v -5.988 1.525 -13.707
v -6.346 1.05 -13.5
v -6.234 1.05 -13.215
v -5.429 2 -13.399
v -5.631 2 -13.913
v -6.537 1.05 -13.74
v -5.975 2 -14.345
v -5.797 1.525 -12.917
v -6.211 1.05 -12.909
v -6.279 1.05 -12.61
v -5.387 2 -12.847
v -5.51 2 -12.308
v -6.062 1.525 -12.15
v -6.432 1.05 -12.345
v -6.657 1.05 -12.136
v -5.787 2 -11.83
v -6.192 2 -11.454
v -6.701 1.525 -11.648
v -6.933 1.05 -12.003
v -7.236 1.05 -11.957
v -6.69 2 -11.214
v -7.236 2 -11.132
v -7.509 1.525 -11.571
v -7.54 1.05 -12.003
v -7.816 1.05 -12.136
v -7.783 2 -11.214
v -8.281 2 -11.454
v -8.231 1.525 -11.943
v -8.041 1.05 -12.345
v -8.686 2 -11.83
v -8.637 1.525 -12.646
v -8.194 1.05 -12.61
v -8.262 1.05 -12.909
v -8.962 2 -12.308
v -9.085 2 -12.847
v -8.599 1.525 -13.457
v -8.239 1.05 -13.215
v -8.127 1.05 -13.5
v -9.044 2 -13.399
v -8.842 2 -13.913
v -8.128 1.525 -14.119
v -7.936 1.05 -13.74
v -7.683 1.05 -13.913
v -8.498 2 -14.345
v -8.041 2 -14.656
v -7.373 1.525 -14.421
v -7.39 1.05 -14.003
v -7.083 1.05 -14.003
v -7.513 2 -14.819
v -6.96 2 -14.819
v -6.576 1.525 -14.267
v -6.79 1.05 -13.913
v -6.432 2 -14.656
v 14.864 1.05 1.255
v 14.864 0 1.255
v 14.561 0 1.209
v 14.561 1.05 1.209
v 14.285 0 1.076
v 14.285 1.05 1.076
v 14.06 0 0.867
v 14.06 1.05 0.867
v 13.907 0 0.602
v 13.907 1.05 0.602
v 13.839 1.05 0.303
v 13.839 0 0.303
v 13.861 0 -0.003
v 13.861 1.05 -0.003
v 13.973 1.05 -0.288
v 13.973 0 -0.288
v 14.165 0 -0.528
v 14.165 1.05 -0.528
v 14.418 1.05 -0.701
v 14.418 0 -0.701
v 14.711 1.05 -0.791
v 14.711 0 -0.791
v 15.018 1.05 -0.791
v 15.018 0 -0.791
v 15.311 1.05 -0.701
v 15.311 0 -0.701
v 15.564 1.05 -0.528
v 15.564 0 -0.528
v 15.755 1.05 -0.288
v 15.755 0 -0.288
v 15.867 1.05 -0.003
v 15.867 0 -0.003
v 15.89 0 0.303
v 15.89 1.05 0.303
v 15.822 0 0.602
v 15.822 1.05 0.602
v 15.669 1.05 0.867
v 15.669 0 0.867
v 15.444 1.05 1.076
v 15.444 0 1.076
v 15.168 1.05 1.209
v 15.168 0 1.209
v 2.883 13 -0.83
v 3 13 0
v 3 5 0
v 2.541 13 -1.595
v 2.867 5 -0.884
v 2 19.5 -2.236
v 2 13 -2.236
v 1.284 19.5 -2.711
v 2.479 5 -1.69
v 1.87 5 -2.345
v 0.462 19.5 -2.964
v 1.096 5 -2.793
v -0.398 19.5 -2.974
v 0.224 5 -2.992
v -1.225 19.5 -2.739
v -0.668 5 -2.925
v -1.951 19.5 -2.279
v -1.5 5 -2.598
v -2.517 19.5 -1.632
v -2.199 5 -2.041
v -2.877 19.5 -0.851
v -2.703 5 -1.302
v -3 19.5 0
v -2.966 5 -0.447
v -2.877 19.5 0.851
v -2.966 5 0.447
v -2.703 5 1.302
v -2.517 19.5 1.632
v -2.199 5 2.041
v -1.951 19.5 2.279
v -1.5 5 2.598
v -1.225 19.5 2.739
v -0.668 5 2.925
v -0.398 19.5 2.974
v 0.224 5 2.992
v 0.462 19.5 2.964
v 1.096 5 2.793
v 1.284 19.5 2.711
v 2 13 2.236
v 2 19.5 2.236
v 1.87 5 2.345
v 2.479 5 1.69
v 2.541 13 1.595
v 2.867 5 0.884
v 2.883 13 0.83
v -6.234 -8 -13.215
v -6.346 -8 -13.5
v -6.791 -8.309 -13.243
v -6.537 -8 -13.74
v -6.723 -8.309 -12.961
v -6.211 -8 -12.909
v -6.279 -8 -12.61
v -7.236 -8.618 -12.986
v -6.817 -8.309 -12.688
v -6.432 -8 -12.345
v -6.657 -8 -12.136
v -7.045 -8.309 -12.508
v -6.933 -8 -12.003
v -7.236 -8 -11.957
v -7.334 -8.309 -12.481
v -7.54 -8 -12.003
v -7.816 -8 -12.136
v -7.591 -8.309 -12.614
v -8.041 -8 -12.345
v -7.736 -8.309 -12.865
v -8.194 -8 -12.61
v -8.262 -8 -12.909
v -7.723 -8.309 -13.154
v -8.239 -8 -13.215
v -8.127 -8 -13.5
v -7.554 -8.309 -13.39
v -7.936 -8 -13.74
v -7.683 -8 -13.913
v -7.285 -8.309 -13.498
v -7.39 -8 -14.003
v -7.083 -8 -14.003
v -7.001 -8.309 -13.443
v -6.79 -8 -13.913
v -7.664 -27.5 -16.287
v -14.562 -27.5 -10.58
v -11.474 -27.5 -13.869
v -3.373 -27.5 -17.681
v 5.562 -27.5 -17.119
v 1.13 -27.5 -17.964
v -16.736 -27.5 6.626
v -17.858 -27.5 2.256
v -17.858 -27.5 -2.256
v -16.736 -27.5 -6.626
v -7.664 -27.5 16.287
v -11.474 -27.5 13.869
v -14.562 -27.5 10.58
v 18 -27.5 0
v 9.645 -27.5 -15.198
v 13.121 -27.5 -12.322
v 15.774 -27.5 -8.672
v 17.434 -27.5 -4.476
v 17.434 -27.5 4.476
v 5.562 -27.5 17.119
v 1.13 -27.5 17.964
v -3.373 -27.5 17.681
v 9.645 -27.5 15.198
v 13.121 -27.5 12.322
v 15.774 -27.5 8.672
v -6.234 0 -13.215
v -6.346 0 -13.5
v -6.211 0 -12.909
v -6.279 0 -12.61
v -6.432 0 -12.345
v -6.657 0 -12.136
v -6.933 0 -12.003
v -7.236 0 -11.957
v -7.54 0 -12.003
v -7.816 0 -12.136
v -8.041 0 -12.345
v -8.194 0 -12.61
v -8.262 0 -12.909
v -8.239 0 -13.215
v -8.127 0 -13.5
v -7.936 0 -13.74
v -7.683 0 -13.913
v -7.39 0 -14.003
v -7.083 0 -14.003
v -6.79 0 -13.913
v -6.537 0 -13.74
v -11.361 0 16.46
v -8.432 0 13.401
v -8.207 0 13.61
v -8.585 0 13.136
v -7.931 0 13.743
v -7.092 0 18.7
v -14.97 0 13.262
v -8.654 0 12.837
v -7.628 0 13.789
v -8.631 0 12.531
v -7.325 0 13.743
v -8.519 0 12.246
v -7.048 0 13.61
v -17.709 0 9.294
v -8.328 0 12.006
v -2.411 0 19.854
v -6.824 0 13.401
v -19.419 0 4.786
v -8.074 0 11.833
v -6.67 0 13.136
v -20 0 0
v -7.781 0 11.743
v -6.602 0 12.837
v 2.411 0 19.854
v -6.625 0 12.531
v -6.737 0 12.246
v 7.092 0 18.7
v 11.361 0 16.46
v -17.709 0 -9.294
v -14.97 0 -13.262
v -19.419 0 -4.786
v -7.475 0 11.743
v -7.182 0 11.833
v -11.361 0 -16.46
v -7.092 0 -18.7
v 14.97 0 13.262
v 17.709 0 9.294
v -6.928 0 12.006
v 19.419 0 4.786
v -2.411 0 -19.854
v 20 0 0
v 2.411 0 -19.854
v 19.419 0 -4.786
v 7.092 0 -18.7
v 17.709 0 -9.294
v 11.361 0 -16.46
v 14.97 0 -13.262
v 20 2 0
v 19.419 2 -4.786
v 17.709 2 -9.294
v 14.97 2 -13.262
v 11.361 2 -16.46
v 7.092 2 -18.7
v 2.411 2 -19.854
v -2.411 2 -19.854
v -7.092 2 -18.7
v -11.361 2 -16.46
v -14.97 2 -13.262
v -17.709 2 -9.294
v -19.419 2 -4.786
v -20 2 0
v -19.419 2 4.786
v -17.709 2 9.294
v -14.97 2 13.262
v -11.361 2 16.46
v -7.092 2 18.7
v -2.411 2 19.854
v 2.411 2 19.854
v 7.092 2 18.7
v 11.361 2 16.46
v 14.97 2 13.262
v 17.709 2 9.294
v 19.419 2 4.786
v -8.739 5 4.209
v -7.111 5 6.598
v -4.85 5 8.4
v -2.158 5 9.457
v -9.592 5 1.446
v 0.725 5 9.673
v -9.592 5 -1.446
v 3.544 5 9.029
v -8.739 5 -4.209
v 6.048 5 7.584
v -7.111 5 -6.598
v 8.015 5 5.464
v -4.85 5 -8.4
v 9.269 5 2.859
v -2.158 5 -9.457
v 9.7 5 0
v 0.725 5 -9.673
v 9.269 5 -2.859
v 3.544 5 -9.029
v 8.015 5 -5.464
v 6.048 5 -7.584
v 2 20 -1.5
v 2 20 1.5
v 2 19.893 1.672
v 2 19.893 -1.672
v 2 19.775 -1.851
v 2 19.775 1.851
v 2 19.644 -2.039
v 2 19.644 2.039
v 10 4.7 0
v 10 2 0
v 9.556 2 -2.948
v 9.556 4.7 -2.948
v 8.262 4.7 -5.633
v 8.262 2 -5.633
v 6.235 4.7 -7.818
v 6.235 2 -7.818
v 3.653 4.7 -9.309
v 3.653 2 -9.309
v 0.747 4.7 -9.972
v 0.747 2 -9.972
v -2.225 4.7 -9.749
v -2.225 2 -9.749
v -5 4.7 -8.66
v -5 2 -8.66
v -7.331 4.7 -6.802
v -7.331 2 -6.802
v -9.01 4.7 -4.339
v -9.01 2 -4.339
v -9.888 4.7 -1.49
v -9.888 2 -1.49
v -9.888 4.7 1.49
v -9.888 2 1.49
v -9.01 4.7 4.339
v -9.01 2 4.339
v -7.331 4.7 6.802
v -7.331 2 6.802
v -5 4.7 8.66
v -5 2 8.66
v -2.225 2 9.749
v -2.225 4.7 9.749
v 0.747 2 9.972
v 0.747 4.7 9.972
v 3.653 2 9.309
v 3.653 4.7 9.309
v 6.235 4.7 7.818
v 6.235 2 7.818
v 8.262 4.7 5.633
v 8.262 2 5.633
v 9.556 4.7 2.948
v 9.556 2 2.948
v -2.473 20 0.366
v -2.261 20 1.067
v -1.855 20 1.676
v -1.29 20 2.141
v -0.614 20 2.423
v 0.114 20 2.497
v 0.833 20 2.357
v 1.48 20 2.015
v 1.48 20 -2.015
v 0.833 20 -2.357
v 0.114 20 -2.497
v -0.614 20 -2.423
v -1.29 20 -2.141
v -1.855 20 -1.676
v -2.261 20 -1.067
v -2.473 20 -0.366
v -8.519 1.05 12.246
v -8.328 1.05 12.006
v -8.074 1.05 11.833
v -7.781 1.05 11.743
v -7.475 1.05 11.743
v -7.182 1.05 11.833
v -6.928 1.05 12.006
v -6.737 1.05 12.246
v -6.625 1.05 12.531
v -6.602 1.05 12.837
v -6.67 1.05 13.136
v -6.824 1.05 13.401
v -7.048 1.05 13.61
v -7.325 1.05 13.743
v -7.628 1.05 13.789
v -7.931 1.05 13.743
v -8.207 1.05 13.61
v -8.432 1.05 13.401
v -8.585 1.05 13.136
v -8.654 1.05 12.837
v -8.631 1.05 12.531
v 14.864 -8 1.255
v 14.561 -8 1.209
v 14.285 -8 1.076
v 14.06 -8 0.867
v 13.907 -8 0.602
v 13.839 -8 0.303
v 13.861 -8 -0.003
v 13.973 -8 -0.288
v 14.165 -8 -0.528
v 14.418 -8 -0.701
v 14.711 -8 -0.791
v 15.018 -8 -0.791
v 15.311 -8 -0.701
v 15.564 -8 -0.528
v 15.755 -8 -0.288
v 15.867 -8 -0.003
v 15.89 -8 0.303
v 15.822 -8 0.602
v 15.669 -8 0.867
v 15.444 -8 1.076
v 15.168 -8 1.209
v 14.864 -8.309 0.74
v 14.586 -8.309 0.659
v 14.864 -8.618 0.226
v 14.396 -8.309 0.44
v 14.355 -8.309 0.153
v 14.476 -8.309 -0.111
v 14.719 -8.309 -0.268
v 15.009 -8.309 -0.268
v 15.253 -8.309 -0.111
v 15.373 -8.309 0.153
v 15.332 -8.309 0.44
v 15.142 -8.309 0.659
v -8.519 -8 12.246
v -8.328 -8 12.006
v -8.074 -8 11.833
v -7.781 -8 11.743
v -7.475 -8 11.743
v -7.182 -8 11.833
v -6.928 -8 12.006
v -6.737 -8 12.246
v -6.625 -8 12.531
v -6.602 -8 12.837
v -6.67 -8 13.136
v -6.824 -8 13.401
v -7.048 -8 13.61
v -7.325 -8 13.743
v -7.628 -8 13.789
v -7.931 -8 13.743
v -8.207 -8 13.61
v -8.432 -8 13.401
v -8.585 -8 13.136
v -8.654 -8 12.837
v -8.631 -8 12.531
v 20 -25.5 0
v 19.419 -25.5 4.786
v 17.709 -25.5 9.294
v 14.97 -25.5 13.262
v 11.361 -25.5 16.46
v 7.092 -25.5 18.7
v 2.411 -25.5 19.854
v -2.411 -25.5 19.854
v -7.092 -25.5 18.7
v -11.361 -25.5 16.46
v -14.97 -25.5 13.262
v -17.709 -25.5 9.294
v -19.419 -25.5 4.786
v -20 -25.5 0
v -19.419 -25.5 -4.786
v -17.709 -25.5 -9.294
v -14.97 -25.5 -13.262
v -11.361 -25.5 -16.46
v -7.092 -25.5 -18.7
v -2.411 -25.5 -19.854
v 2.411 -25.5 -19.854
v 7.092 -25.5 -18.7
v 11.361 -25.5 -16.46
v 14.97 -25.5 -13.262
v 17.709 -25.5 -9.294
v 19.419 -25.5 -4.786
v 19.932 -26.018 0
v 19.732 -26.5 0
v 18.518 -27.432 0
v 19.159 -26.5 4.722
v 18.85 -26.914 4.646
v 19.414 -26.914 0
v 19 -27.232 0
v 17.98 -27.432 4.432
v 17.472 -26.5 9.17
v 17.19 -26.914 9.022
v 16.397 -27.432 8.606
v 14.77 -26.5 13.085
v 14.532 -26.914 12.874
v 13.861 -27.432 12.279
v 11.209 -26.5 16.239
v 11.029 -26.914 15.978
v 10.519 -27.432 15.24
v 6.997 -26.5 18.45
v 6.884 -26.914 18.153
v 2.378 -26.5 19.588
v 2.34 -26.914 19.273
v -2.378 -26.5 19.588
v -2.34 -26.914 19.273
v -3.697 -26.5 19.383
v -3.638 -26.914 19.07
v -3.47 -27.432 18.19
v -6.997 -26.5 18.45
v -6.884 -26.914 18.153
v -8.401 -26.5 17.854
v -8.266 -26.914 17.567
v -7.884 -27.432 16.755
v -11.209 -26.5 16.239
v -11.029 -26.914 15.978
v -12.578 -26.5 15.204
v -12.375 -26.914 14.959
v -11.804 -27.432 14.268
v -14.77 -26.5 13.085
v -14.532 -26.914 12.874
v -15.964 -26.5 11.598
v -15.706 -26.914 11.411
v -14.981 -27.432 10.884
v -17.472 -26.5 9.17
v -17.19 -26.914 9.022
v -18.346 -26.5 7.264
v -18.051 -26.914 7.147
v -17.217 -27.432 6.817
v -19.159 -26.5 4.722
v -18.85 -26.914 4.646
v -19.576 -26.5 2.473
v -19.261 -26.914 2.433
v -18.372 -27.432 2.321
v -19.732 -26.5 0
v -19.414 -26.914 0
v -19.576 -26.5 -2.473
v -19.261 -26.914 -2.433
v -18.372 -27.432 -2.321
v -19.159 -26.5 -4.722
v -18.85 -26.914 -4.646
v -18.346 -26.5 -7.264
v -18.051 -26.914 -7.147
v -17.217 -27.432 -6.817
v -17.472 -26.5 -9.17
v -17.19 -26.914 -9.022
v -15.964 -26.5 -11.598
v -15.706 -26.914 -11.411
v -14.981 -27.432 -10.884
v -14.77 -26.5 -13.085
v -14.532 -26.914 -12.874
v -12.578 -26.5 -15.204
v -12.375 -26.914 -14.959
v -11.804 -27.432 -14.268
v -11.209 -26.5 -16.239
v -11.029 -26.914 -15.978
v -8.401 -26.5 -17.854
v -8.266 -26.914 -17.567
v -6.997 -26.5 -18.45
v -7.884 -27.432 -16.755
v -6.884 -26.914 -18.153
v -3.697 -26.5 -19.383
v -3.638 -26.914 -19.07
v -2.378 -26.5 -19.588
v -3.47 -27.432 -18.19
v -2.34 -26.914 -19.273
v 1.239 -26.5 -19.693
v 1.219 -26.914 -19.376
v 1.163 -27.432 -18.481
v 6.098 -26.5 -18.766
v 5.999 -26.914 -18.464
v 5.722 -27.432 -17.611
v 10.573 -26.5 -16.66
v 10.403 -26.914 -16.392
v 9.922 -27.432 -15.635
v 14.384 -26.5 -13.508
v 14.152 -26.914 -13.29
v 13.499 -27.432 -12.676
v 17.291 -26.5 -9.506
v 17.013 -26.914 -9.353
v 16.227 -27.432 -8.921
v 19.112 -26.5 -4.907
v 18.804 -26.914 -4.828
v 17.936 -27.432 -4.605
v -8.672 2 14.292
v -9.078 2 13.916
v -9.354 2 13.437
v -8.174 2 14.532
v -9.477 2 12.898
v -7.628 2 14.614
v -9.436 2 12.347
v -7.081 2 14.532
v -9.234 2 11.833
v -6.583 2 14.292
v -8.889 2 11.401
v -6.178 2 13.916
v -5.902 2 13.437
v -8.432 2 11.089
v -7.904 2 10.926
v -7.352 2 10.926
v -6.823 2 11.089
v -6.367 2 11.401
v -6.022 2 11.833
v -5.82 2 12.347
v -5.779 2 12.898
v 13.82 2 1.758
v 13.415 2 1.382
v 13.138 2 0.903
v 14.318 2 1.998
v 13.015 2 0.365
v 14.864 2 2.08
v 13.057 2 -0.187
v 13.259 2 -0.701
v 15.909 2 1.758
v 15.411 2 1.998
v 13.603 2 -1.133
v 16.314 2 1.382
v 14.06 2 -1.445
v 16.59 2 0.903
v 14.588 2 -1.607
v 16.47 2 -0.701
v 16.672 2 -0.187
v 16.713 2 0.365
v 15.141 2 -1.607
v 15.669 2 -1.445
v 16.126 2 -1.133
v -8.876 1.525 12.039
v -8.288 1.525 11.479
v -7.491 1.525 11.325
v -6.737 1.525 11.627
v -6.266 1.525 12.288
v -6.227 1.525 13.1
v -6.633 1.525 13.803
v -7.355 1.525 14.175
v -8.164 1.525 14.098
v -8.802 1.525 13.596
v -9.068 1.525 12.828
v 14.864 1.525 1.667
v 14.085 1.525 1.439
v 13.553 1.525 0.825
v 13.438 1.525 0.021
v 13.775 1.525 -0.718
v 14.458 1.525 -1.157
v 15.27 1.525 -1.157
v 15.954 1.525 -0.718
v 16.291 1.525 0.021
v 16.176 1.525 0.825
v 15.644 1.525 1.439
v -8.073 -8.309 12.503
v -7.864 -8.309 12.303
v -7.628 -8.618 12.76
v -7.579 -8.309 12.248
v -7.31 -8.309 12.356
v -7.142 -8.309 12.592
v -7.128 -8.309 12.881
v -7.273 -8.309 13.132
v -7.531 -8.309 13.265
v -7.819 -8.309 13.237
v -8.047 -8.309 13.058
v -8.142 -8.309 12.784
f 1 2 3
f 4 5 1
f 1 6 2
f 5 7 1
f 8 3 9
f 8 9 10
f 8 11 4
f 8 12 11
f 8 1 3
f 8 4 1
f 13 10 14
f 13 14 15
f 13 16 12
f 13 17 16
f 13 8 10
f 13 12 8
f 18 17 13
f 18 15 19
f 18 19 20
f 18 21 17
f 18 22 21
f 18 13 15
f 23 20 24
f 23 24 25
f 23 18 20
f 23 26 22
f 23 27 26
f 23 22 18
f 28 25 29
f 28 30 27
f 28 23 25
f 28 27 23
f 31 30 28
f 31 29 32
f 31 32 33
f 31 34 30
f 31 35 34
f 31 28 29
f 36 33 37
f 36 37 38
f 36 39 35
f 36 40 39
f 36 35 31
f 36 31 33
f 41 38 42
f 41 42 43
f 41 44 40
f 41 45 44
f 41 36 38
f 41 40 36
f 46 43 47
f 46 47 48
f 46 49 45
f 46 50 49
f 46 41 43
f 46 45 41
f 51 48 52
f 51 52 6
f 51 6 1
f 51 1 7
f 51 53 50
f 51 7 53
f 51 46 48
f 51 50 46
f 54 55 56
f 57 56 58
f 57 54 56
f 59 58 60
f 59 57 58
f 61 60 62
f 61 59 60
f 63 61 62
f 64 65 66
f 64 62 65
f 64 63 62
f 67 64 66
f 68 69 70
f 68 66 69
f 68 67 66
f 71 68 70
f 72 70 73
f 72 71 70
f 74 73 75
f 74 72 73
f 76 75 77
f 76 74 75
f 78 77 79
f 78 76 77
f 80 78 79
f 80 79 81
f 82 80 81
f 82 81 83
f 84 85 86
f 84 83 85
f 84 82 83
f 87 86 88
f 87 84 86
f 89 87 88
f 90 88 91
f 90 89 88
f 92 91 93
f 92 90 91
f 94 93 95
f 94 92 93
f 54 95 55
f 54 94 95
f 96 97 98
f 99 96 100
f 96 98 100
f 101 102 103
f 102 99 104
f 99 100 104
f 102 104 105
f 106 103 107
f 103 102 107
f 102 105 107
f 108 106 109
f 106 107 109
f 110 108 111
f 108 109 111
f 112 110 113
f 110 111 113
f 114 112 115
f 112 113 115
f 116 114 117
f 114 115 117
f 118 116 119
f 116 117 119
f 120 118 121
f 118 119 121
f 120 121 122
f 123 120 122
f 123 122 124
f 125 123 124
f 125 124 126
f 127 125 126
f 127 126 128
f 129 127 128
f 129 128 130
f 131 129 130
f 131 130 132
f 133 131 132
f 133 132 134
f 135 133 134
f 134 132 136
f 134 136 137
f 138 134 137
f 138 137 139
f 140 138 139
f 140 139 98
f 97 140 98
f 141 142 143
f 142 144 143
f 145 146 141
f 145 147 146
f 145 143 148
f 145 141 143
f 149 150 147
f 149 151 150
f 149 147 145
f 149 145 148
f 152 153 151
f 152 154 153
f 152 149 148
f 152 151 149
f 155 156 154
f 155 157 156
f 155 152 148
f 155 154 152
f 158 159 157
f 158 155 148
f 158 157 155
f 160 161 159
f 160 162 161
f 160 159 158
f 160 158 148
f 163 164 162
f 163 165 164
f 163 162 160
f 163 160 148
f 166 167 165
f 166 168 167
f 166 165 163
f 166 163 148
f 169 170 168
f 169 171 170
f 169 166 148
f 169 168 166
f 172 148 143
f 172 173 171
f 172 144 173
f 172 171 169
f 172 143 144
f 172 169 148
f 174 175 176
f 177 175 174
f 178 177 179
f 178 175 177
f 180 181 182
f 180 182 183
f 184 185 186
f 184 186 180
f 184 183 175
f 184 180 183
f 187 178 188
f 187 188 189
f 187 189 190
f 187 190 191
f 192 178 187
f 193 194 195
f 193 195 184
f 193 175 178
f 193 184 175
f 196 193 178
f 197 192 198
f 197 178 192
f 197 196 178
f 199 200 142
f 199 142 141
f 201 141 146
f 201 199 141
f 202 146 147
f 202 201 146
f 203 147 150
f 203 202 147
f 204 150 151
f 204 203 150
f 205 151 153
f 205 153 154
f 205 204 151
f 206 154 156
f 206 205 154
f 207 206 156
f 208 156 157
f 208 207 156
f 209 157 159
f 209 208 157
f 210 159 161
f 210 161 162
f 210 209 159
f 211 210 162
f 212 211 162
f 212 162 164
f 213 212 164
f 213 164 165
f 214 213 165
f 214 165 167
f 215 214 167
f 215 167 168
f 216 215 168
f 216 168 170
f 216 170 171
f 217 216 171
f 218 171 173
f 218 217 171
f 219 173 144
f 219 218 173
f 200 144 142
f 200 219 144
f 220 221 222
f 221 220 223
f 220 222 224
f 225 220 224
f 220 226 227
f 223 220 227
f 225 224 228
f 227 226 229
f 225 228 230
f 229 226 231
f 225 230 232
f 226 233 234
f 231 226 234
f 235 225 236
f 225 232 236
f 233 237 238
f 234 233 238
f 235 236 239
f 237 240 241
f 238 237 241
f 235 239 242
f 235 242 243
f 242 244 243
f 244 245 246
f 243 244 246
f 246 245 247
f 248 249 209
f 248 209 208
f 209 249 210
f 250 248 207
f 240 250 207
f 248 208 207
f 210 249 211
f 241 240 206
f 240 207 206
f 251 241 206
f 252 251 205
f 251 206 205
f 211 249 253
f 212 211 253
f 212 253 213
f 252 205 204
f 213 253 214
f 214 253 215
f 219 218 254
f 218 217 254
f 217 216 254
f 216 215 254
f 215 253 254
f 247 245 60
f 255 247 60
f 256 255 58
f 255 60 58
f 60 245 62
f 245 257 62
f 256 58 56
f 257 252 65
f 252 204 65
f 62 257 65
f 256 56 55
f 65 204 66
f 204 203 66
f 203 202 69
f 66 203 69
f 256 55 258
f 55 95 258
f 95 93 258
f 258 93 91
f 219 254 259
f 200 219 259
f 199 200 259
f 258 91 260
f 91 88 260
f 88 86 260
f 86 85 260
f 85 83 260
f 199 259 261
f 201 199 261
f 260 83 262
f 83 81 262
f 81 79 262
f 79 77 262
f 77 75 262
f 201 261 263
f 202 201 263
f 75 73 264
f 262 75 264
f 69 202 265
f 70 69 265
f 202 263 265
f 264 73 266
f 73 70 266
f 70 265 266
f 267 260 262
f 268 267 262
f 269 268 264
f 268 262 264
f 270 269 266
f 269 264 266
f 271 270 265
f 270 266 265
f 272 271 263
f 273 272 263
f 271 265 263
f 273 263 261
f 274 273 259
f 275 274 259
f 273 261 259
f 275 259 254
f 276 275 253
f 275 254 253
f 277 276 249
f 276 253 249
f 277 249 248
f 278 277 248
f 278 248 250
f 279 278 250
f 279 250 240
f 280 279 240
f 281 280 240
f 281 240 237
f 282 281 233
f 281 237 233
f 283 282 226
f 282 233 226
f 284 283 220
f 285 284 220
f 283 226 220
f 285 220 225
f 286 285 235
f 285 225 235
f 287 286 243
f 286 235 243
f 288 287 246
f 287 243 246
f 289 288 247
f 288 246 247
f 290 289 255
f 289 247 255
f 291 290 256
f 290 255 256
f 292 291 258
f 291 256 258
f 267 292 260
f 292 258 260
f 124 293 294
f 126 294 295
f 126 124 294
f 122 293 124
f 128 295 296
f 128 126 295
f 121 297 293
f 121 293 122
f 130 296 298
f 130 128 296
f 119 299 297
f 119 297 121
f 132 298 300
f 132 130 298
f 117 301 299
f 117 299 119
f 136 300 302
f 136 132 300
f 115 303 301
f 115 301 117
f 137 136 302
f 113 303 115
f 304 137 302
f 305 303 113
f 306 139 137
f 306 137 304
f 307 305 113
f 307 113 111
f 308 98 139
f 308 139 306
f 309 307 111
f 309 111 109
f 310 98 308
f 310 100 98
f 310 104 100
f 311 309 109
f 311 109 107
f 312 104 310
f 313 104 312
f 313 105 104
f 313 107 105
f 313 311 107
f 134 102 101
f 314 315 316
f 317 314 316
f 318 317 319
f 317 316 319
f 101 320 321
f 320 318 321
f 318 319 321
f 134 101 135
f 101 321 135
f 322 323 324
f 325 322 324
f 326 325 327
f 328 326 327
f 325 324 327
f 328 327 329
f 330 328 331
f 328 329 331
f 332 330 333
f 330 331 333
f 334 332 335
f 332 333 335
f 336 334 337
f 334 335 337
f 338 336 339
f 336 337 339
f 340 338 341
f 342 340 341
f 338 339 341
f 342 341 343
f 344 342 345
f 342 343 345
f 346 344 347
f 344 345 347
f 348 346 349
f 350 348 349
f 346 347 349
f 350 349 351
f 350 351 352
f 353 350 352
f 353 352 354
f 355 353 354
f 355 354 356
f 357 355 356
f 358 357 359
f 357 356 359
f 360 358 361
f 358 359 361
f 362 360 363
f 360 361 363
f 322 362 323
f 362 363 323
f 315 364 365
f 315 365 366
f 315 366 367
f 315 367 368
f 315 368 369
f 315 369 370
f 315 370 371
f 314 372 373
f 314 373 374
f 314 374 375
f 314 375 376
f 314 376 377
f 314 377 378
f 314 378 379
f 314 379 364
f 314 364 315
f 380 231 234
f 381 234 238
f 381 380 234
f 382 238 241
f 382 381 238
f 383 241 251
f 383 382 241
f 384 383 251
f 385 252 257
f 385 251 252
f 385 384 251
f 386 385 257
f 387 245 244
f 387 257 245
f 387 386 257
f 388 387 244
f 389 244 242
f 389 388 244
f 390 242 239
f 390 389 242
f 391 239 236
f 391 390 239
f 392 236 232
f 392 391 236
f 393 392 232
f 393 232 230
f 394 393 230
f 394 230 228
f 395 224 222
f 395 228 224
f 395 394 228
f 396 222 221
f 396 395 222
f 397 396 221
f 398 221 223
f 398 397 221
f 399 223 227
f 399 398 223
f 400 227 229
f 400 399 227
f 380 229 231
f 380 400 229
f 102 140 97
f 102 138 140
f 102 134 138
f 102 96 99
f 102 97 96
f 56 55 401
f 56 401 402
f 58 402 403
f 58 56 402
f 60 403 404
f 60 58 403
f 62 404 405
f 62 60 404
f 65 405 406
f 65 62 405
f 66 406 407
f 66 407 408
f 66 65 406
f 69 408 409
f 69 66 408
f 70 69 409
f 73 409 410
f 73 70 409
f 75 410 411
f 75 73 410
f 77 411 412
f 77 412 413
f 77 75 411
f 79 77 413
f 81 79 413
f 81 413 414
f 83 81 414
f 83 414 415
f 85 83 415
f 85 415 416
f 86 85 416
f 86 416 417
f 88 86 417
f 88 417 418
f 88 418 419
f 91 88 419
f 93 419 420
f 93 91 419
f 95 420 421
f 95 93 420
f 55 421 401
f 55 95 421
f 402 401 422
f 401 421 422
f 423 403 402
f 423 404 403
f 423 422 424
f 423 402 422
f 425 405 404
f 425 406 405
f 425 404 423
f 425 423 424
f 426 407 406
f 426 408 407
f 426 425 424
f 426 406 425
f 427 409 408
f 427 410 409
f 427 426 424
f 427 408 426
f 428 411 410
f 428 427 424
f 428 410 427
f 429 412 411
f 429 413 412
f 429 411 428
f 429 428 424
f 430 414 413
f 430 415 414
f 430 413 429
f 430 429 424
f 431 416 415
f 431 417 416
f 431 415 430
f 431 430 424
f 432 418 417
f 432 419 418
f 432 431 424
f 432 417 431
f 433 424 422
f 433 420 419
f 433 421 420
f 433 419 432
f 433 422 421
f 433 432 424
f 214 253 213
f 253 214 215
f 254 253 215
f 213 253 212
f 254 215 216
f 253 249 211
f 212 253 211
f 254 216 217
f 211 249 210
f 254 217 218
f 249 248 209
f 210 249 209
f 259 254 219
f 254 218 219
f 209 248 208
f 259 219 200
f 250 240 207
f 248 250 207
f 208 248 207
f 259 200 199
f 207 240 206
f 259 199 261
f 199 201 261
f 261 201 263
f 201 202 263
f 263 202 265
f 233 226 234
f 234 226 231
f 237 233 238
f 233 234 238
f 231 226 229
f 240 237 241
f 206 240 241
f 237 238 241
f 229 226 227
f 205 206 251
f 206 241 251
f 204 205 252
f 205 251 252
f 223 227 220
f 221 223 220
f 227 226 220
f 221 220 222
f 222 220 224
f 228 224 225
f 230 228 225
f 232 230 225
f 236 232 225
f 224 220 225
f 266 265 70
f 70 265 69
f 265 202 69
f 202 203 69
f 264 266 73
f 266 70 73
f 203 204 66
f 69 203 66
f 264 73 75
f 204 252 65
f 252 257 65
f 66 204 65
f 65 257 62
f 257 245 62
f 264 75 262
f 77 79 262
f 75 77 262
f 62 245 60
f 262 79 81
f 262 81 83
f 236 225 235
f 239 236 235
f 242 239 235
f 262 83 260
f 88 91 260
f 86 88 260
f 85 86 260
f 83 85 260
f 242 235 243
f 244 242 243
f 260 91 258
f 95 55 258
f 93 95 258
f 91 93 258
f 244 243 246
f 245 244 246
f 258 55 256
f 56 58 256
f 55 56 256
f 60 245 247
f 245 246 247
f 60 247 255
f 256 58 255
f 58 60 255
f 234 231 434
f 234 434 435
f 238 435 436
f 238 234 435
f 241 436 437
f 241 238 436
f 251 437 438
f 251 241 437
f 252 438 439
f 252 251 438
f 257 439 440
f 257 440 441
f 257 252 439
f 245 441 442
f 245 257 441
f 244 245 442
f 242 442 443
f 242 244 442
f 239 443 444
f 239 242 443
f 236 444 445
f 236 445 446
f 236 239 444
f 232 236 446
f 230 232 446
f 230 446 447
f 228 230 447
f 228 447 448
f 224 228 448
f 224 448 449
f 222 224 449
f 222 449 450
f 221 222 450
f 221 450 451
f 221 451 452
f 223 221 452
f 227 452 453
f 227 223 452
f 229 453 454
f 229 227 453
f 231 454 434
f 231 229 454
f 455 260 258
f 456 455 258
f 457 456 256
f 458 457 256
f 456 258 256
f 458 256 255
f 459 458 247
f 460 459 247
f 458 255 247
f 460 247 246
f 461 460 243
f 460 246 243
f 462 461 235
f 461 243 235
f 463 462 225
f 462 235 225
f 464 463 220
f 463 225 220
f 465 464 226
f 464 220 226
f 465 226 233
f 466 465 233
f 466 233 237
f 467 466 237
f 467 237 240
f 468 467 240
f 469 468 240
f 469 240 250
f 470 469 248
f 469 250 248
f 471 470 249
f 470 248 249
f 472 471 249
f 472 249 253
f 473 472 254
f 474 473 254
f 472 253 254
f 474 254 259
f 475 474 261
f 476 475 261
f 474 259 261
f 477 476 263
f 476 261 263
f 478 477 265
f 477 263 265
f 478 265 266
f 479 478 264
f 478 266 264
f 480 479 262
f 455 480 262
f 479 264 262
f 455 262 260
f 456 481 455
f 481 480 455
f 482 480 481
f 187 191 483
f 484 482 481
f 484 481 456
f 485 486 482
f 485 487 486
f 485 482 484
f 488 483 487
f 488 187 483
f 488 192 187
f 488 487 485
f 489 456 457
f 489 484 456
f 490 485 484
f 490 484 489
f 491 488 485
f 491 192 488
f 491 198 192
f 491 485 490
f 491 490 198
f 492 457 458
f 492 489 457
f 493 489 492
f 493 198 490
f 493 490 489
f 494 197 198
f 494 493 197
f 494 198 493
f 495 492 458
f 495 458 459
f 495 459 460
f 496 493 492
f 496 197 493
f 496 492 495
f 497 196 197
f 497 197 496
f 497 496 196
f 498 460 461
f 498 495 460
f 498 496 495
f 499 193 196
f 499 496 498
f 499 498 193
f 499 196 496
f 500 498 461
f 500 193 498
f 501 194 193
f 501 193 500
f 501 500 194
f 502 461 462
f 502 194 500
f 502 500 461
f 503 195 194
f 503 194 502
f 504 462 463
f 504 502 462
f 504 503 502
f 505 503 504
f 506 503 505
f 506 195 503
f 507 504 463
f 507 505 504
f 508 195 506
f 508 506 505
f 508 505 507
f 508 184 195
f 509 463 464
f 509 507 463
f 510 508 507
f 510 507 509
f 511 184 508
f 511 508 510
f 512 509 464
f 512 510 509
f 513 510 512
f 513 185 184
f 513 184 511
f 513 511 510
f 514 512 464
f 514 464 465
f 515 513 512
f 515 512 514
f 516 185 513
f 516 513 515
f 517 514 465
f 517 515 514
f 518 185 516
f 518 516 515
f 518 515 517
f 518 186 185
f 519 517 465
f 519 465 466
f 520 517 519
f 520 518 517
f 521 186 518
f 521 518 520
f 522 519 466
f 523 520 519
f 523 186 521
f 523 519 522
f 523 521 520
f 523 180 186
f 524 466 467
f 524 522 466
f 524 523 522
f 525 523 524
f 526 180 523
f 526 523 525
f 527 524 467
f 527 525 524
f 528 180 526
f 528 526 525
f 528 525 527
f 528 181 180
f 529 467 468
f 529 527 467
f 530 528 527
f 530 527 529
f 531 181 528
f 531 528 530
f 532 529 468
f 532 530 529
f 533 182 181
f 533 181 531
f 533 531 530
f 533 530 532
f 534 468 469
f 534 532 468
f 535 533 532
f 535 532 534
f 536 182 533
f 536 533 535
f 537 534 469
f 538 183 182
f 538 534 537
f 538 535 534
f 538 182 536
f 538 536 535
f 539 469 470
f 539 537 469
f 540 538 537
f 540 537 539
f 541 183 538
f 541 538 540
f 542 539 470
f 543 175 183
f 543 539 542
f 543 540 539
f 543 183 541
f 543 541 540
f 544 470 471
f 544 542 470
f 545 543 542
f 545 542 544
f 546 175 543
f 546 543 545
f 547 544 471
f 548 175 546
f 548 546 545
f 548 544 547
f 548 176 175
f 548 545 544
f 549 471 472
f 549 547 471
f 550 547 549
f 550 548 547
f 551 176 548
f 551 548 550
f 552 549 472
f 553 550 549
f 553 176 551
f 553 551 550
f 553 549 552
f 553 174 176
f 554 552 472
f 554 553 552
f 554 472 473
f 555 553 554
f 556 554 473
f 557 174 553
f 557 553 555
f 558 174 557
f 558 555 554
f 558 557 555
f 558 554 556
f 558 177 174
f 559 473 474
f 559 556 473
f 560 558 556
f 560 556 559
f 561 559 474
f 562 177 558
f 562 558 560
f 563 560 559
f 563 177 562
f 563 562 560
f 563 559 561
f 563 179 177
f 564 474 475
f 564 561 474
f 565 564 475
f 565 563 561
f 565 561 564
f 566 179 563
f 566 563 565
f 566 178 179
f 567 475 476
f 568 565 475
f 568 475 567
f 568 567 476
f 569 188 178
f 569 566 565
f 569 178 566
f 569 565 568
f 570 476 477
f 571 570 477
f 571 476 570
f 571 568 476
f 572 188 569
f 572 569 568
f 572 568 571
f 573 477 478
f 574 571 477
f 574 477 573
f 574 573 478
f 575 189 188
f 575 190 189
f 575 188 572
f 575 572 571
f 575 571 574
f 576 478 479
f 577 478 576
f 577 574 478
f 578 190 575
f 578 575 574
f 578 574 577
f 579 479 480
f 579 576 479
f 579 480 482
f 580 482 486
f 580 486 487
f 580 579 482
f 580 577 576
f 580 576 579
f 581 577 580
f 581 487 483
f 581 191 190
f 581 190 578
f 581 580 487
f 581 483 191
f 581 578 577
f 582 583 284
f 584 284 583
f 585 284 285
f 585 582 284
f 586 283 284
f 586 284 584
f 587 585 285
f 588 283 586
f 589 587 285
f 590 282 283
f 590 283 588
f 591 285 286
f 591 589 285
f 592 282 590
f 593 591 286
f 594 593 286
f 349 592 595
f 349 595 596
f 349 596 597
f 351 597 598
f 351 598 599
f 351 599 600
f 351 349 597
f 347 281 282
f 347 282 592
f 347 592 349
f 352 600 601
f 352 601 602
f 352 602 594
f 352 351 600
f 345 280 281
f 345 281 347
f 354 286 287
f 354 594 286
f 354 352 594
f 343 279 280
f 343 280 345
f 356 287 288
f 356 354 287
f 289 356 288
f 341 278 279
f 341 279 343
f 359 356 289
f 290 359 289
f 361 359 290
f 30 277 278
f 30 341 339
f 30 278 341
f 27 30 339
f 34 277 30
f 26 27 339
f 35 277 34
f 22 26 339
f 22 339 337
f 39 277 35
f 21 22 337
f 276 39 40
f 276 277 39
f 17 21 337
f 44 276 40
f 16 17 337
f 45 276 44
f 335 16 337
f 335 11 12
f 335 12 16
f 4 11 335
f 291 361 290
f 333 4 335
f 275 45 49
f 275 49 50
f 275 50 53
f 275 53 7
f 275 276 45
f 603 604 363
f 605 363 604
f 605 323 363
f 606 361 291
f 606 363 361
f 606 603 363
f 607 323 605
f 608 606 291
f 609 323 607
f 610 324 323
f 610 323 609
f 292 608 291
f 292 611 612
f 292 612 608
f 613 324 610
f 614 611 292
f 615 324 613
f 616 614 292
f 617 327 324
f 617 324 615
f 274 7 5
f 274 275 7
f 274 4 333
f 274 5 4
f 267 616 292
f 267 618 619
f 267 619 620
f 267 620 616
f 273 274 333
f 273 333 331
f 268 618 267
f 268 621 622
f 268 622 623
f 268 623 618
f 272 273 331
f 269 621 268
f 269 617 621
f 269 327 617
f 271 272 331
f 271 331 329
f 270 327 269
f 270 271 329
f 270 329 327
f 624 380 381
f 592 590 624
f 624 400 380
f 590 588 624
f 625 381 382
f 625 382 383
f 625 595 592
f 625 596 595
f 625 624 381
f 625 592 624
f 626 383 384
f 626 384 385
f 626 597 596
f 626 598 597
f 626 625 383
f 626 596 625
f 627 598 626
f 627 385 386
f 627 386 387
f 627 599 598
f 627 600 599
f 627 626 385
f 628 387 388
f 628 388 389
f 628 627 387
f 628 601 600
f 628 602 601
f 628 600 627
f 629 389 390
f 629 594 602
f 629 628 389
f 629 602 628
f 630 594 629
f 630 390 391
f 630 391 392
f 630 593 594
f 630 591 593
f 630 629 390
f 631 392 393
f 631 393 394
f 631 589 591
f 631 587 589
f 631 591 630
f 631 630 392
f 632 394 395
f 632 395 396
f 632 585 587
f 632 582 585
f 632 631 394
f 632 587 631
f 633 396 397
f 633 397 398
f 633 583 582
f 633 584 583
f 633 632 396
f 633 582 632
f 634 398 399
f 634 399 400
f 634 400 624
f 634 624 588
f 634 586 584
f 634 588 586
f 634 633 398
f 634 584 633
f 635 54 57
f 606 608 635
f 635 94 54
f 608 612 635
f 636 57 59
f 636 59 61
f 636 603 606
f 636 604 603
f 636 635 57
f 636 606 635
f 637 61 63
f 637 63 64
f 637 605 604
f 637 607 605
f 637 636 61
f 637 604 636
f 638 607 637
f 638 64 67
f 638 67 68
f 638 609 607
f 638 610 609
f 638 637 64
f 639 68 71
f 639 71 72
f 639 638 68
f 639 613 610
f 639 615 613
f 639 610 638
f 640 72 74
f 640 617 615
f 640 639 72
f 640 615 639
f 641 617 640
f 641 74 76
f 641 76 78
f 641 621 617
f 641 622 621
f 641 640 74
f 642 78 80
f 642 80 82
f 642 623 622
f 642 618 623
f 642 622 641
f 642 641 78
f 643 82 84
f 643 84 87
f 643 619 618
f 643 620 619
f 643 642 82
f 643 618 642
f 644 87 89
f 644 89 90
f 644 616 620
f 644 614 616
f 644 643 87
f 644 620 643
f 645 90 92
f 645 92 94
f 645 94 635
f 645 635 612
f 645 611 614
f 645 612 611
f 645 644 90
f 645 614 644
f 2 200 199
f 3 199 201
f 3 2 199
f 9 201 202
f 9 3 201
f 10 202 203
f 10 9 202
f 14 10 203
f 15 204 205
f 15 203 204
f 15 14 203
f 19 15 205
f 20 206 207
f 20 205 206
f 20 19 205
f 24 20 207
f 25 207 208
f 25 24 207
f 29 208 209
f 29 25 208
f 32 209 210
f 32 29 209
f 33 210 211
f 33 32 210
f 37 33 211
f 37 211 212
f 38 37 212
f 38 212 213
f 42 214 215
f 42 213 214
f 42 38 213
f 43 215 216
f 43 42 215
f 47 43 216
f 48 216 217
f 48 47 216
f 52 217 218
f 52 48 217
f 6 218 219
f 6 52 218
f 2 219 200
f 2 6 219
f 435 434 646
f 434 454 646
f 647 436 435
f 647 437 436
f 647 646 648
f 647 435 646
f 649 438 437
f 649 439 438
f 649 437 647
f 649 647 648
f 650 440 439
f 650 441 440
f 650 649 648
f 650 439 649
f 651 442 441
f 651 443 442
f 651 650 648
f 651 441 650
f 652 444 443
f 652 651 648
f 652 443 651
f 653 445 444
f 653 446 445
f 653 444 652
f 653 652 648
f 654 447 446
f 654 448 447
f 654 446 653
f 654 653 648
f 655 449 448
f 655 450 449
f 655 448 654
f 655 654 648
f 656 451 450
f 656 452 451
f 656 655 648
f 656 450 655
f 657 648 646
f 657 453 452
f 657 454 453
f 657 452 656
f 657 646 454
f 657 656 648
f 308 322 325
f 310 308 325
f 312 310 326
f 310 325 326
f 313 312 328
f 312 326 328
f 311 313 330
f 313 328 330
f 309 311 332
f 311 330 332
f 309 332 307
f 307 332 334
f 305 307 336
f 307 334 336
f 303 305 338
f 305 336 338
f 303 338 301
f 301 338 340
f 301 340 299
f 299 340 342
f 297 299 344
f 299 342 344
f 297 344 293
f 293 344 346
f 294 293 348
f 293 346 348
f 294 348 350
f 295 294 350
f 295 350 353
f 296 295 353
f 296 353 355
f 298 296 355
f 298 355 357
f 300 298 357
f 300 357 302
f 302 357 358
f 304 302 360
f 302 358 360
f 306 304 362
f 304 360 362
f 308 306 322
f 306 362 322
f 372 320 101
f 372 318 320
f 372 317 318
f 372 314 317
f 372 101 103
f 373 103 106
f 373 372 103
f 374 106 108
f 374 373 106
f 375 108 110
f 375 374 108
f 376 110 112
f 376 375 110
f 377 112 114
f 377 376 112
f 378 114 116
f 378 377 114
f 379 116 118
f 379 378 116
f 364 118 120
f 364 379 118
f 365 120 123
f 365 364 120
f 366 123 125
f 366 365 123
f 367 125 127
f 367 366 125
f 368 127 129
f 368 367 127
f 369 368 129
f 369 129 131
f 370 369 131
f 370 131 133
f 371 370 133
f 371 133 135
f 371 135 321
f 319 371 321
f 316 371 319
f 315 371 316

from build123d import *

# Parameters (mm, degrees)
CROQUIS1_R              = 20
SALIENTE_EXTRUIR1_DEPTH = 2
CROQUIS2_R              = 10
SALIENTE_EXTRUIR2_DEPTH = 3
CROQUIS3_R              = 3
SALIENTE_EXTRUIR3_DEPTH = 15
CHAFL_N1_SIZE           = 0.5
CHAFL_N2_SIZE           = 0.3
CROQUIS4_R              = 20
SALIENTE_EXTRUIR4_DEPTH = 27.5
REDONDEO1_R             = 2
CORTAR_EXTRUIR2_DEPTH   = 7
MATRIZC8_COUNT          = 3


with BuildPart() as part:
    # Croquis1 → Saliente-Extruir1 (new body)
    with BuildSketch(Plane(origin=(0, 0, 0), x_dir=(1, 0, 0), z_dir=(0, 1, 0))):
        Circle(CROQUIS1_R)
    extrude(amount=SALIENTE_EXTRUIR1_DEPTH)

    # Croquis2 → Saliente-Extruir2 (add)
    with BuildSketch(Plane(origin=(0, 2, 0), x_dir=(1, 0, 0), z_dir=(0, 1, 0))):
        Circle(CROQUIS2_R)
    extrude(amount=SALIENTE_EXTRUIR2_DEPTH)

    # Croquis3 → Saliente-Extruir3 (add)
    with BuildSketch(Plane(origin=(0, 5, 0), x_dir=(1, 0, 0), z_dir=(0, 1, 0))):
        Circle(CROQUIS3_R)
    extrude(amount=SALIENTE_EXTRUIR3_DEPTH)

    # Chaflán1
    chafl_n1_edges = [part.edges().sort_by_distance(p)[0] for p in [
        (-3, 20, 0),
    ]]
    chamfer(chafl_n1_edges, length=CHAFL_N1_SIZE)

    # Chaflán2
    chafl_n2_edges = [part.edges().sort_by_distance(p)[0] for p in [
        (-10, 5, 0),
    ]]
    chamfer(chafl_n2_edges, length=CHAFL_N2_SIZE)

    # Croquis6 → Cortar-Extruir2 (cut)
    with BuildSketch(Plane(origin=(0, 20, 0), x_dir=(1, 0, 0), z_dir=(0, 1, 0))):
        Polygon((2, 0), (2, -3), (4, -3), (4, 3), (2, 3), align=None)
    extrude(amount=-CORTAR_EXTRUIR2_DEPTH, mode=Mode.SUBTRACT)


with BuildPart() as body_2:
    # Croquis4 → Saliente-Extruir4 (new body)
    with BuildSketch(Plane.XZ):
        Circle(CROQUIS4_R)
    extrude(amount=SALIENTE_EXTRUIR4_DEPTH)

    # Redondeo1
    redondeo1_edges = [body_2.edges().sort_by_distance(p)[0] for p in [
        (-20, -27.5, 0),
    ]]
    fillet(redondeo1_edges, radius=REDONDEO1_R)


with BuildPart() as avellanado_para_tornillo_con_cabeza_oval_tool:
    # Croquis9 → Avellanado para tornillo con cabeza ovalada de #11 (revolve)
    with BuildSketch(Plane(origin=(14.86435082, 2, 0.225997135), x_dir=(0, 0, 1), z_dir=(1, 0, 0))):
        Polygon((0, 0), (0, 10.618105319), (1.0287, 10), (1.0287, 0.94962912), (1.8542, 0), align=None)
    avellanado_para_tornillo_con_cabeza_oval = revolve(axis=Axis((14.86435082, 8.35, 0.225997135), (0, -1, 0)))


with BuildPart() as part_1:
    add(part.part)

    # Avellanado para tornillo con cabeza ovalada de #11: cut by avellanado_para_tornillo_con_cabeza_oval_tool
    add(avellanado_para_tornillo_con_cabeza_oval_tool.part, mode=Mode.SUBTRACT)


with BuildPart() as body_2_1:
    add(body_2.part)

    # Avellanado para tornillo con cabeza ovalada de #11: cut by avellanado_para_tornillo_con_cabeza_oval_tool
    add(avellanado_para_tornillo_con_cabeza_oval_tool.part, mode=Mode.SUBTRACT)


with BuildPart() as matrizc8_tool:
    # MatrizC8: Avellanado para tornillo con cabeza ovalada de #11 ×3 about axis
    matrizc8_axis = Axis((0, 0, 0), (0, 1, 0))
    for i in range(1, MATRIZC8_COUNT):
        add(avellanado_para_tornillo_con_cabeza_oval.rotate(matrizc8_axis, i * 360 / MATRIZC8_COUNT))


with BuildPart() as part_2:
    add(part_1.part)

    # MatrizC8: cut by matrizc8_tool
    add(matrizc8_tool.part, mode=Mode.SUBTRACT)


with BuildPart() as body_2_2:
    add(body_2_1.part)

    # MatrizC8: cut by matrizc8_tool
    add(matrizc8_tool.part, mode=Mode.SUBTRACT)


solid = Compound([part_2.part, body_2_2.part])
